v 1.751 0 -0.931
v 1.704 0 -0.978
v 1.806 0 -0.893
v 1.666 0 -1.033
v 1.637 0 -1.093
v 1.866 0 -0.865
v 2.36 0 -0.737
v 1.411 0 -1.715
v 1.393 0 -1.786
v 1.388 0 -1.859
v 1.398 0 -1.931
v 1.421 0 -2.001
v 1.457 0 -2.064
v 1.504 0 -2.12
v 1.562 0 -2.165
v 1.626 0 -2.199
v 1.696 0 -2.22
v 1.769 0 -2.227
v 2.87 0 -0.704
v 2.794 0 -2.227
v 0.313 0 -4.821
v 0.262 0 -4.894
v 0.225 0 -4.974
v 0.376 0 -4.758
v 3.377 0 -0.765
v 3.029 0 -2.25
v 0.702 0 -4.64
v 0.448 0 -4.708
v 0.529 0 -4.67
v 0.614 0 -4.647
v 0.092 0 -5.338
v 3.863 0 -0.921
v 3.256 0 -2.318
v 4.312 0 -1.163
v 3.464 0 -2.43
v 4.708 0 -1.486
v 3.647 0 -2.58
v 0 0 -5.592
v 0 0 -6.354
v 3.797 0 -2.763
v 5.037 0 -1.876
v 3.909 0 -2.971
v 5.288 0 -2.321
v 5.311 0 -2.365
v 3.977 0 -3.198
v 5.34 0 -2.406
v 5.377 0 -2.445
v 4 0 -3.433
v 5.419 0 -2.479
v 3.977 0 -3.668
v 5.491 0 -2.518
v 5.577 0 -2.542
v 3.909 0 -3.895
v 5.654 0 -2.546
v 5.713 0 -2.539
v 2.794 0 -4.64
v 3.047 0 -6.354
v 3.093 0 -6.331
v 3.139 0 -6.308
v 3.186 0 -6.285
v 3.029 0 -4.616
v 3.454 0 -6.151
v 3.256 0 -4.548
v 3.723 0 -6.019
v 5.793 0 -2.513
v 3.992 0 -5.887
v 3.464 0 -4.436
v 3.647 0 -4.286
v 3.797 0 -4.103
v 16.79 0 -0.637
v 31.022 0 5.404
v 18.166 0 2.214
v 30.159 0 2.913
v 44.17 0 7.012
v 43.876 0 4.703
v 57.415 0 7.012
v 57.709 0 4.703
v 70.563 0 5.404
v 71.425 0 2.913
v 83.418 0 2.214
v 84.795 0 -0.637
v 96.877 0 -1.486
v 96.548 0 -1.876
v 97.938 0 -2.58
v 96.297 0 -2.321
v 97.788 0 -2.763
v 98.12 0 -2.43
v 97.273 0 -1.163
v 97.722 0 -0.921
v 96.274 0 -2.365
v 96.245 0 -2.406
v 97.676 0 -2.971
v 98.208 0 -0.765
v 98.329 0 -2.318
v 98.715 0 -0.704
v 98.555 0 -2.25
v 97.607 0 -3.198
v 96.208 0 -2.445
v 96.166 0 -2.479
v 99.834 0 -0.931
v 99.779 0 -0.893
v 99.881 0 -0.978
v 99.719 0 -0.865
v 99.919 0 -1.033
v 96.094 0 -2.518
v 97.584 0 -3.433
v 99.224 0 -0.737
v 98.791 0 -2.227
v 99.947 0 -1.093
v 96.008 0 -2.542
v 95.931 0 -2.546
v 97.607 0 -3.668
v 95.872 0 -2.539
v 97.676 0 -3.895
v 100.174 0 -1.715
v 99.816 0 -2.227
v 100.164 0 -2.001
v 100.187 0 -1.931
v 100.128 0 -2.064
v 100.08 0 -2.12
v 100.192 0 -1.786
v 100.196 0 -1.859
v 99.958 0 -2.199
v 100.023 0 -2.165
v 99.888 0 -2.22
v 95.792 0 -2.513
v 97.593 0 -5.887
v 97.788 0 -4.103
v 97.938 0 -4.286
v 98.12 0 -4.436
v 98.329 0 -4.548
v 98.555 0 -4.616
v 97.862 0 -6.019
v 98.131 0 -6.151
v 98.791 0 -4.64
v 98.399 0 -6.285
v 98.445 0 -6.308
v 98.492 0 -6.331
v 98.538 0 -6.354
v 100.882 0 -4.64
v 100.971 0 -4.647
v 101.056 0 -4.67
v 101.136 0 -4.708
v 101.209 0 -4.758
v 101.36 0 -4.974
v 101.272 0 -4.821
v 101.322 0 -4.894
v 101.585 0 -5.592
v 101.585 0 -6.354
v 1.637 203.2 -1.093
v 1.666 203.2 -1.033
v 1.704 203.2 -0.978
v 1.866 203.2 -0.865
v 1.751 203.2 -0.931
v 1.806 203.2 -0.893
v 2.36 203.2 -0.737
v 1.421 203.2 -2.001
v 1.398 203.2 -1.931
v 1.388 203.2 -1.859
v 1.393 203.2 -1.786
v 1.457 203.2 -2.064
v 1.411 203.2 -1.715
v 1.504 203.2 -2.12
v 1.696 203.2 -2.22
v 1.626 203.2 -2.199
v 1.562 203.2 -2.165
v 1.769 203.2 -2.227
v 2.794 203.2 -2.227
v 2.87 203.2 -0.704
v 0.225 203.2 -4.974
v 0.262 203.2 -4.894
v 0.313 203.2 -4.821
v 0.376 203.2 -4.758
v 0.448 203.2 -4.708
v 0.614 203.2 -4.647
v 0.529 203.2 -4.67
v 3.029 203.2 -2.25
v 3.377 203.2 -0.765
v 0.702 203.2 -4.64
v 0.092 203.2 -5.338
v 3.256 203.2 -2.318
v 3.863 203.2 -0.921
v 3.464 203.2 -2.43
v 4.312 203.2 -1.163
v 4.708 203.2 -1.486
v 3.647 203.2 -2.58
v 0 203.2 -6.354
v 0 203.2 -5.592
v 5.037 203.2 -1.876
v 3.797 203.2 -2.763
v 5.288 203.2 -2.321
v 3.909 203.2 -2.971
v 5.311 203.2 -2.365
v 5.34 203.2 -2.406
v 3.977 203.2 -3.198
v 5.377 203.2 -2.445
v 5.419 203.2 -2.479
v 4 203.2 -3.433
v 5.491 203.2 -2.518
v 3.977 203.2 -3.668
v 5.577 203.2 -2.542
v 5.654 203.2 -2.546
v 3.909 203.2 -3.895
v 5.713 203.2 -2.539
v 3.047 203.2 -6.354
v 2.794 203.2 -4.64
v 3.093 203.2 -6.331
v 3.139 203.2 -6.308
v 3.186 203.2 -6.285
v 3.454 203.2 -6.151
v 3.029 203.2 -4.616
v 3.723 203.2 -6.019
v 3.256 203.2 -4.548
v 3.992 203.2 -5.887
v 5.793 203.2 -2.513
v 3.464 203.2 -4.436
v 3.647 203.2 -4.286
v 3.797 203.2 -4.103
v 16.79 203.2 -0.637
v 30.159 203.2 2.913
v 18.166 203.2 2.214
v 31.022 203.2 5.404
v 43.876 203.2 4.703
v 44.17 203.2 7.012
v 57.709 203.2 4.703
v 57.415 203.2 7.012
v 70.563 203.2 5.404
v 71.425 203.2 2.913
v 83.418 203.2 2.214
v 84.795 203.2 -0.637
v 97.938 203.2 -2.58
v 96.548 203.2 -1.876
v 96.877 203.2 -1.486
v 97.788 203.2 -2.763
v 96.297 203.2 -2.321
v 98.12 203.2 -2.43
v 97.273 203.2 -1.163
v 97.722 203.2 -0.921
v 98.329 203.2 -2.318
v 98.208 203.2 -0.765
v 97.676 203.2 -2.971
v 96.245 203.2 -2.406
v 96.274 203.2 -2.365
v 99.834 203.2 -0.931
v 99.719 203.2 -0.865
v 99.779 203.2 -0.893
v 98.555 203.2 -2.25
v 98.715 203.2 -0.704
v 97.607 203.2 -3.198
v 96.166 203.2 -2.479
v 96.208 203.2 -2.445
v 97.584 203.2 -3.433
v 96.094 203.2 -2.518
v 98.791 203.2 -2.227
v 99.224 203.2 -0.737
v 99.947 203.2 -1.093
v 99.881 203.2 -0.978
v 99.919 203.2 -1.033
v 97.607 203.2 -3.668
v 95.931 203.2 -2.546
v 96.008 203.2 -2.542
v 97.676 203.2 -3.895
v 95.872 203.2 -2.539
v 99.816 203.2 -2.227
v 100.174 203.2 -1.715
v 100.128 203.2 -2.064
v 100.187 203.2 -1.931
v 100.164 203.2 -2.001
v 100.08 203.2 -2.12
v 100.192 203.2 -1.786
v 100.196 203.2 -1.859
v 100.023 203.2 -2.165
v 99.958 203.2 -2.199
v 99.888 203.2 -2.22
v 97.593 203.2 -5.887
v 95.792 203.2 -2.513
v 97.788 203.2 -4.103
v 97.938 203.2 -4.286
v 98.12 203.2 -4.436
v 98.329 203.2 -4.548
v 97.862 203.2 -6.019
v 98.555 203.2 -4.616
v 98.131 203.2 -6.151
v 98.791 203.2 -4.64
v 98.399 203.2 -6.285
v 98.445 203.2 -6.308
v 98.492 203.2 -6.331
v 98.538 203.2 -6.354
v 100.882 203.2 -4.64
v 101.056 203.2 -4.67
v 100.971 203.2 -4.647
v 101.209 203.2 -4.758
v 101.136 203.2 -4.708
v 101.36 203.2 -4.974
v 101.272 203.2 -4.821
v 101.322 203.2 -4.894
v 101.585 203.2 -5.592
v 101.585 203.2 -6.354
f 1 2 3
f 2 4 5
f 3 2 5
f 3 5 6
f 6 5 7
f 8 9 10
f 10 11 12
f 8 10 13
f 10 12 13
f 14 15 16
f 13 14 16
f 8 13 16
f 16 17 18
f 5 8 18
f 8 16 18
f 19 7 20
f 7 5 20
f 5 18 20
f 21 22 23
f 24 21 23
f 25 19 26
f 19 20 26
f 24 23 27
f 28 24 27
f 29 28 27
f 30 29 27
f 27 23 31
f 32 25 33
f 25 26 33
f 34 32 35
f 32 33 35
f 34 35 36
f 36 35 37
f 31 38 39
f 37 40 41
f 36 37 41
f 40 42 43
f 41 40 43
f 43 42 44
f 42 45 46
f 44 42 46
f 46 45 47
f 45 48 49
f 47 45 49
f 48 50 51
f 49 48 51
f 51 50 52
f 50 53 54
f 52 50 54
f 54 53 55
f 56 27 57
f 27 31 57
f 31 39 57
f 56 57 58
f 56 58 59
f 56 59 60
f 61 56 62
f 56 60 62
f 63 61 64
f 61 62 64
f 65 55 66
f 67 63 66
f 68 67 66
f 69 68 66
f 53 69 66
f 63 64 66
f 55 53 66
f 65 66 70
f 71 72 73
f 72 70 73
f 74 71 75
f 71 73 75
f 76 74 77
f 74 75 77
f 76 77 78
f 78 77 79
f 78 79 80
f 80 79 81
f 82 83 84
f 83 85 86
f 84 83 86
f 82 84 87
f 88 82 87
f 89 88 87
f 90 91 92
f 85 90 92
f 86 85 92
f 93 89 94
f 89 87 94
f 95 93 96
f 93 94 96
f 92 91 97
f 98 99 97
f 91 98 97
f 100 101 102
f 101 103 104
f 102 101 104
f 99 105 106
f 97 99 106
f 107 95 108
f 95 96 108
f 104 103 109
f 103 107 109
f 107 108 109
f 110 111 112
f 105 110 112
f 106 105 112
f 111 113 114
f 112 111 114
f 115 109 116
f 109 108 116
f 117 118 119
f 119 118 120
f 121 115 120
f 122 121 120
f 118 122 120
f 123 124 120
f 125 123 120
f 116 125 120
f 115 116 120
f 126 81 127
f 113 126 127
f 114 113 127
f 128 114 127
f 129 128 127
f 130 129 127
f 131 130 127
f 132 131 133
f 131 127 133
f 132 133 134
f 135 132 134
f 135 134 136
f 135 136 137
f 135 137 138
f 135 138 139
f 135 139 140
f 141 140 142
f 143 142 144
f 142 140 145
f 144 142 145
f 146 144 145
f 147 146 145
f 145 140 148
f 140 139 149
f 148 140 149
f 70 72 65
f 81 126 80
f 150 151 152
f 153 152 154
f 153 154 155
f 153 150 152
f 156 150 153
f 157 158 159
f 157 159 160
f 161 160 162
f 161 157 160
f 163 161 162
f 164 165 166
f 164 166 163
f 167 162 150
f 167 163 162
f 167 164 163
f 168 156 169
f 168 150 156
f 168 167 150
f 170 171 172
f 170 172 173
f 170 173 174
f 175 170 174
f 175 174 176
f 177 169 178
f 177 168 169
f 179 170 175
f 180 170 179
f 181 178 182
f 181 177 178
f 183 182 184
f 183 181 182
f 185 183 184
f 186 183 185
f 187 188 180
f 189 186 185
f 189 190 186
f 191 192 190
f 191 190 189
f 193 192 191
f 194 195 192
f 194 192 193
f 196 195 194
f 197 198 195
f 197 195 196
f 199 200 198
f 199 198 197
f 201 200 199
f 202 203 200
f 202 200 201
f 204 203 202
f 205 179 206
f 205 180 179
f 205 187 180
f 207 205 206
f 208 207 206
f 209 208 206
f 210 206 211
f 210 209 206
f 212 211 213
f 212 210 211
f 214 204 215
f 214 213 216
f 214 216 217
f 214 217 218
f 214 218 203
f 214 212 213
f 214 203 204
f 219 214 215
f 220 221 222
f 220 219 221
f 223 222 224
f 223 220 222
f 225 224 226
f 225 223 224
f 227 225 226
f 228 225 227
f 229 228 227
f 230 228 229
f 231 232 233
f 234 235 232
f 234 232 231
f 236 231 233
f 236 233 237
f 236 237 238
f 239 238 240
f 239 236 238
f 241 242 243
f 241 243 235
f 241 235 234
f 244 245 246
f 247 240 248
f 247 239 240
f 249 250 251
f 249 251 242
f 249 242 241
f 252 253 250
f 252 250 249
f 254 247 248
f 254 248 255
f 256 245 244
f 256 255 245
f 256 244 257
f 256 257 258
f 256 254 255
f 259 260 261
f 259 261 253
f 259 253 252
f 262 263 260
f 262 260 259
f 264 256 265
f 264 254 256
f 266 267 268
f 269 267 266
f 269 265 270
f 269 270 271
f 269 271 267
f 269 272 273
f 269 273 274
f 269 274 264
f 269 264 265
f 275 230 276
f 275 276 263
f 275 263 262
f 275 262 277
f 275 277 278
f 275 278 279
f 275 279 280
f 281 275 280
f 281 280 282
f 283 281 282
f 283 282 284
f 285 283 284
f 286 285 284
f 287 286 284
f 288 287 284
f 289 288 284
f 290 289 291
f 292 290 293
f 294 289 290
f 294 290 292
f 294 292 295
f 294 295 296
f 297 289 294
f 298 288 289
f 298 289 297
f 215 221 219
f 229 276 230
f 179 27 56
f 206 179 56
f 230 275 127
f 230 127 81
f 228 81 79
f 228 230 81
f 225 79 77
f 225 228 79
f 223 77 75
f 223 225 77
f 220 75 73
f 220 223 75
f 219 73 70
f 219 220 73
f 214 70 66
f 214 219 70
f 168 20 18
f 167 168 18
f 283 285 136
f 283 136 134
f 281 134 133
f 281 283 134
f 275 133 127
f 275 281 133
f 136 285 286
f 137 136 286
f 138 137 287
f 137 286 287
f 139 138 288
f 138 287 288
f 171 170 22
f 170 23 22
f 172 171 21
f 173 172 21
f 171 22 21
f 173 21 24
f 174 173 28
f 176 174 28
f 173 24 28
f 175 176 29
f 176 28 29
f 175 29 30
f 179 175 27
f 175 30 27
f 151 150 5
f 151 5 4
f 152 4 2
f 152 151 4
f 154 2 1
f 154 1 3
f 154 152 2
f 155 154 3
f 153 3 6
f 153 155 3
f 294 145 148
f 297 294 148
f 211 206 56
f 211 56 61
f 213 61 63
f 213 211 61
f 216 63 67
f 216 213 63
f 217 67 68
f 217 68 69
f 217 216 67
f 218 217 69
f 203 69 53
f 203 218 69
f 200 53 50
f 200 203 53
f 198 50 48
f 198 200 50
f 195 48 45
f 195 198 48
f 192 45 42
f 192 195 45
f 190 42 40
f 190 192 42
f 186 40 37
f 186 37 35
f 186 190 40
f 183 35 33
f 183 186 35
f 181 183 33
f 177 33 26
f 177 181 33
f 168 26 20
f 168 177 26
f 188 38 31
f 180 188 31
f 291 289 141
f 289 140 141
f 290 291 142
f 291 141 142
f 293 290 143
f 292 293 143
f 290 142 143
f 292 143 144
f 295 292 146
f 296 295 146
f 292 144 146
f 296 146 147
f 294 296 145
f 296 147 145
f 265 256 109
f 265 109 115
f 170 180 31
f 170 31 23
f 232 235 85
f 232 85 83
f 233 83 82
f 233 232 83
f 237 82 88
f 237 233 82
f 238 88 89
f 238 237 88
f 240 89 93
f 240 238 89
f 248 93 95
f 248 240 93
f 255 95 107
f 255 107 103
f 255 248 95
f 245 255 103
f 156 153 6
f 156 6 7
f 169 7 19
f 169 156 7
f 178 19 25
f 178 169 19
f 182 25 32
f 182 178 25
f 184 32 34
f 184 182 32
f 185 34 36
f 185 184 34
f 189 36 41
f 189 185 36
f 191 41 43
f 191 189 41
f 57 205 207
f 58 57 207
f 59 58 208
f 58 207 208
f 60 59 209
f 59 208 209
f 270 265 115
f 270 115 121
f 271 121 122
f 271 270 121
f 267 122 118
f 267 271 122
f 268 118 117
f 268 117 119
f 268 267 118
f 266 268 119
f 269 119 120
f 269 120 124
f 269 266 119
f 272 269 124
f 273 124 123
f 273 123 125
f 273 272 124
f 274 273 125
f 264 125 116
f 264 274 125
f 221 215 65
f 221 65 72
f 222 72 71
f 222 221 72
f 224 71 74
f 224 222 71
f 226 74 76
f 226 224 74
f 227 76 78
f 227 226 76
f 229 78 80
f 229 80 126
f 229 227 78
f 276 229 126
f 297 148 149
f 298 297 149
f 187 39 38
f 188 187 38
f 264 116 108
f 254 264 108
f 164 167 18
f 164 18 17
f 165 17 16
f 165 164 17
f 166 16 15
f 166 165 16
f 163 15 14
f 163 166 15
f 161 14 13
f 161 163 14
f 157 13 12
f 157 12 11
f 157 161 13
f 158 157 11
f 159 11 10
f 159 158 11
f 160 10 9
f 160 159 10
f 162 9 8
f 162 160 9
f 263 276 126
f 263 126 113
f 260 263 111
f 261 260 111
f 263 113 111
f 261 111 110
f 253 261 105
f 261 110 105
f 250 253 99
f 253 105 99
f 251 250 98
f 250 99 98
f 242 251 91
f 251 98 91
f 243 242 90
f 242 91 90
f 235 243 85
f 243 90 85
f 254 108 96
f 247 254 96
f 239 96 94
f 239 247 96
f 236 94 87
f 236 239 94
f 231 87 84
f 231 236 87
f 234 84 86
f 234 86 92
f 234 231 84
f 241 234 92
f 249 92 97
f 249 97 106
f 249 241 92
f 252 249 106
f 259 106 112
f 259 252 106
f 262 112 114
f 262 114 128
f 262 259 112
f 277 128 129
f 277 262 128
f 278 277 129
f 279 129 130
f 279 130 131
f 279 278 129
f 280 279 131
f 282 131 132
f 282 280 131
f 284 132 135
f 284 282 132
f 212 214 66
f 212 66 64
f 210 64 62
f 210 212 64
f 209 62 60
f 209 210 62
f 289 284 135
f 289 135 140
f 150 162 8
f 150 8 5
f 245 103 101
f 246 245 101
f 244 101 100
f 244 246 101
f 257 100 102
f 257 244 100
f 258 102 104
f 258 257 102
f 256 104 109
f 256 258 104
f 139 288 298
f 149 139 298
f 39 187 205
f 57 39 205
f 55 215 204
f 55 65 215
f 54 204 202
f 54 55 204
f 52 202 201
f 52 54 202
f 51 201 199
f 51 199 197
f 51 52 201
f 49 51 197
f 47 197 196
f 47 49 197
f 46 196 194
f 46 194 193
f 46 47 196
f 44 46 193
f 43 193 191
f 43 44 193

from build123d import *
from build123d.topology import SkipClean

# Parameters (mm, degrees)
BOSS_EXTRUDE1_DEPTH = 203.2
CUT_EXTRUDE1_DEPTH  = 204.2
BOSS_EXTRUDE2_DEPTH = 203.2
FILLET1_R           = 0.508
BOSS_EXTRUDE3_DEPTH = 203.2
CUT_EXTRUDE2_DEPTH  = 204.2
FILLET2_R           = 0.381


with BuildPart() as part:
    # Sketch1 → Boss-Extrude1 (new body)
    with BuildSketch(Plane(origin=(0, 0, 0), x_dir=(1, 0, 0), z_dir=(0, 1, 0))):
        with BuildLine():
            Line((101.58476, 5.338063609), (101.58476, 6.354063609))
            ThreePointArc((101.58476, 6.354063609), (50.79238, 19.05), (0, 6.354063609))
            Line((0, 6.354063609), (0, 5.338063609))
            Line((0, 5.338063609), (1.338554634, 5.338063609))
            ThreePointArc((1.338554634, 5.338063609), (45.188812602, 17.378377427), (90.062082389, 10.016044959))
            ThreePointArc((90.062082389, 10.016044959), (91.218156641, 9.549225792), (92.368682931, 9.068895628))
            ThreePointArc((92.368682931, 9.068895628), (96.251044015, 7.328911154), (100.06076, 5.435148318))
            Line((100.06076, 5.435148318), (100.06076, 4.322063609))
            ThreePointArc((100.06076, 4.322063609), (100.209549755, 3.962853364), (100.56876, 3.814063609))
            Line((100.56876, 3.814063609), (100.82276, 3.814063609))
            Line((100.82276, 3.814063609), (101.58476, 5.338063609))
        make_face()
    extrude(amount=BOSS_EXTRUDE1_DEPTH)

    # Sketch3 → Cut-Extrude1 (cut, through all)
    with BuildSketch(Plane(origin=(0, 203.2, 0), x_dir=(1, 0, 0), z_dir=(0, 1, 0))):
        Polygon((100.06076, 2.923708758), (101.58476, 2.923708758), (101.58476, 5.592063609), (100.06076, 5.435148318), align=None)
        Polygon((0, 5.592063609), (0.4067845, 4.474432381), (0, 4.474432381), align=None)
    extrude(amount=-CUT_EXTRUDE1_DEPTH, mode=Mode.SUBTRACT)

    # Sketch2 → Boss-Extrude2 (add)
    with BuildSketch(Plane(origin=(0, 203.2, 0), x_dir=(1, 0, 0), z_dir=(0, 1, 0))):
        with BuildLine():
            Line((98.79076, 4.639563606), (101.238078351, 4.639563606))
            Line((101.238078351, 4.639563606), (101.58476, 5.592063609))
            Line((101.58476, 5.592063609), (100.06076, 5.435148318))
            ThreePointArc((100.06076, 5.435148318), (99.355551952, 5.800115132), (98.647640508, 6.159810213))
            ThreePointArc((98.647640508, 6.159810213), (96.114471858, 2.891665388), (99.718733273, 0.865088556))
            ThreePointArc((99.718733273, 0.865088556), (99.858345852, 0.953692868), (99.947271519, 1.093100982))
            Line((99.947271519, 1.093100982), (100.173716674, 1.715253931))
            ThreePointArc((100.173716674, 1.715253931), (100.127790714, 2.064096228), (99.815693785, 2.226563606))
            Line((99.815693785, 2.226563606), (98.79076, 2.226563606))
            ThreePointArc((98.79076, 2.226563606), (97.58426, 3.433063606), (98.79076, 4.639563606))
        make_face()
        with BuildLine():
            ThreePointArc((1.769066215, 2.226563606), (1.456969286, 2.064096228), (1.411043326, 1.715253931))
            Line((1.411043326, 1.715253931), (1.637488481, 1.093100982))
            ThreePointArc((1.637488481, 1.093100982), (1.726414148, 0.953692868), (1.866026727, 0.865088556))
            ThreePointArc((1.866026727, 0.865088556), (5.470288142, 2.891665388), (2.937119492, 6.159810213))
            ThreePointArc((2.937119492, 6.159810213), (2.136102242, 5.752311703), (1.338554634, 5.338063609))
            Line((1.338554634, 5.338063609), (0.09244844, 5.338063609))
            Line((0.09244844, 5.338063609), (0.346681649, 4.639563606))
            Line((0.346681649, 4.639563606), (2.794, 4.639563606))
            ThreePointArc((2.794, 4.639563606), (4.0005, 3.433063606), (2.794, 2.226563606))
            Line((2.794, 2.226563606), (1.769066215, 2.226563606))
        make_face()
    extrude(amount=-BOSS_EXTRUDE2_DEPTH)

    # Fillet1
    fillet1_edges = [part.edges().sort_by_distance(p)[0] for p in [
        (101.238078351, 101.6, -4.639563606),
        (0.346681649, 101.6, -4.639563606),
    ]]
    fillet(fillet1_edges, radius=FILLET1_R)

    # Sketch4 → Boss-Extrude3 (add, through all)
    with BuildSketch(Plane(origin=(0, 203.2, 0), x_dir=(1, 0, 0), z_dir=(0, 1, 0))):
        with BuildLine():
            ThreePointArc((3.991870192, 5.886782672), (5.288114571, 4.544379384), (5.419434578, 2.682914602))
            ThreePointArc((5.419434578, 2.682914602), (50.79238, -7.212984057), (96.165325422, 2.682914602))
            ThreePointArc((96.165325422, 2.682914602), (96.296645429, 4.544379384), (97.592889808, 5.886782672))
            ThreePointArc((97.592889808, 5.886782672), (50.79238, -4.926984057), (3.991870192, 5.886782672))
        make_face()
        with BuildLine():
            ThreePointArc((2.937119492, 6.159810213), (3.478250935, 6.076438514), (3.991870192, 5.886782672))
            ThreePointArc((3.991870192, 5.886782672), (3.588373028, 6.084817853), (3.185713825, 6.284551329))
            ThreePointArc((3.185713825, 6.284551329), (3.061375909, 6.222261981), (2.937119492, 6.159810213))
        make_face()
        with BuildLine():
            ThreePointArc((98.399046175, 6.284551329), (97.996386972, 6.084817853), (97.592889808, 5.886782672))
            ThreePointArc((97.592889808, 5.886782672), (98.106509065, 6.076438514), (98.647640508, 6.159810213))
            ThreePointArc((98.647640508, 6.159810213), (98.523384091, 6.222261981), (98.399046175, 6.284551329))
        make_face()
    extrude(amount=-BOSS_EXTRUDE3_DEPTH)

    # Sketch5 → Cut-Extrude2 (cut, through all)
    with SkipClean():  # keep this step's faces unmerged: merging them makes the solid invalid here
        with BuildSketch(Plane(origin=(0, 203.2, 0), x_dir=(1, 0, 0), z_dir=(0, 1, 0))):
            with BuildLine():
                ThreePointArc((98.399046175, 6.284551329), (98.468630342, 6.31928211), (98.538189172, 6.354063609))
                Line((98.538189172, 6.354063609), (101.58476, 6.354063609))
                ThreePointArc((101.58476, 6.354063609), (50.79238, 19.05), (0, 6.354063609))
                Line((0, 6.354063609), (3.046570828, 6.354063609))
                ThreePointArc((3.046570828, 6.354063609), (3.116129658, 6.31928211), (3.185713825, 6.284551329))
                ThreePointArc((3.185713825, 6.284551329), (50.79238, 17.526), (98.399046175, 6.284551329))
            make_face()
        extrude(amount=-CUT_EXTRUDE2_DEPTH, mode=Mode.SUBTRACT)

    # Fillet2
    fillet2_edges = [part.edges().sort_by_distance(p)[0] for p in [
        (5.419434578, 101.6, -2.682914602),
        (96.165325422, 101.6, -2.682914602),
    ]]
    fillet(fillet2_edges, radius=FILLET2_R)


solid = part.part
